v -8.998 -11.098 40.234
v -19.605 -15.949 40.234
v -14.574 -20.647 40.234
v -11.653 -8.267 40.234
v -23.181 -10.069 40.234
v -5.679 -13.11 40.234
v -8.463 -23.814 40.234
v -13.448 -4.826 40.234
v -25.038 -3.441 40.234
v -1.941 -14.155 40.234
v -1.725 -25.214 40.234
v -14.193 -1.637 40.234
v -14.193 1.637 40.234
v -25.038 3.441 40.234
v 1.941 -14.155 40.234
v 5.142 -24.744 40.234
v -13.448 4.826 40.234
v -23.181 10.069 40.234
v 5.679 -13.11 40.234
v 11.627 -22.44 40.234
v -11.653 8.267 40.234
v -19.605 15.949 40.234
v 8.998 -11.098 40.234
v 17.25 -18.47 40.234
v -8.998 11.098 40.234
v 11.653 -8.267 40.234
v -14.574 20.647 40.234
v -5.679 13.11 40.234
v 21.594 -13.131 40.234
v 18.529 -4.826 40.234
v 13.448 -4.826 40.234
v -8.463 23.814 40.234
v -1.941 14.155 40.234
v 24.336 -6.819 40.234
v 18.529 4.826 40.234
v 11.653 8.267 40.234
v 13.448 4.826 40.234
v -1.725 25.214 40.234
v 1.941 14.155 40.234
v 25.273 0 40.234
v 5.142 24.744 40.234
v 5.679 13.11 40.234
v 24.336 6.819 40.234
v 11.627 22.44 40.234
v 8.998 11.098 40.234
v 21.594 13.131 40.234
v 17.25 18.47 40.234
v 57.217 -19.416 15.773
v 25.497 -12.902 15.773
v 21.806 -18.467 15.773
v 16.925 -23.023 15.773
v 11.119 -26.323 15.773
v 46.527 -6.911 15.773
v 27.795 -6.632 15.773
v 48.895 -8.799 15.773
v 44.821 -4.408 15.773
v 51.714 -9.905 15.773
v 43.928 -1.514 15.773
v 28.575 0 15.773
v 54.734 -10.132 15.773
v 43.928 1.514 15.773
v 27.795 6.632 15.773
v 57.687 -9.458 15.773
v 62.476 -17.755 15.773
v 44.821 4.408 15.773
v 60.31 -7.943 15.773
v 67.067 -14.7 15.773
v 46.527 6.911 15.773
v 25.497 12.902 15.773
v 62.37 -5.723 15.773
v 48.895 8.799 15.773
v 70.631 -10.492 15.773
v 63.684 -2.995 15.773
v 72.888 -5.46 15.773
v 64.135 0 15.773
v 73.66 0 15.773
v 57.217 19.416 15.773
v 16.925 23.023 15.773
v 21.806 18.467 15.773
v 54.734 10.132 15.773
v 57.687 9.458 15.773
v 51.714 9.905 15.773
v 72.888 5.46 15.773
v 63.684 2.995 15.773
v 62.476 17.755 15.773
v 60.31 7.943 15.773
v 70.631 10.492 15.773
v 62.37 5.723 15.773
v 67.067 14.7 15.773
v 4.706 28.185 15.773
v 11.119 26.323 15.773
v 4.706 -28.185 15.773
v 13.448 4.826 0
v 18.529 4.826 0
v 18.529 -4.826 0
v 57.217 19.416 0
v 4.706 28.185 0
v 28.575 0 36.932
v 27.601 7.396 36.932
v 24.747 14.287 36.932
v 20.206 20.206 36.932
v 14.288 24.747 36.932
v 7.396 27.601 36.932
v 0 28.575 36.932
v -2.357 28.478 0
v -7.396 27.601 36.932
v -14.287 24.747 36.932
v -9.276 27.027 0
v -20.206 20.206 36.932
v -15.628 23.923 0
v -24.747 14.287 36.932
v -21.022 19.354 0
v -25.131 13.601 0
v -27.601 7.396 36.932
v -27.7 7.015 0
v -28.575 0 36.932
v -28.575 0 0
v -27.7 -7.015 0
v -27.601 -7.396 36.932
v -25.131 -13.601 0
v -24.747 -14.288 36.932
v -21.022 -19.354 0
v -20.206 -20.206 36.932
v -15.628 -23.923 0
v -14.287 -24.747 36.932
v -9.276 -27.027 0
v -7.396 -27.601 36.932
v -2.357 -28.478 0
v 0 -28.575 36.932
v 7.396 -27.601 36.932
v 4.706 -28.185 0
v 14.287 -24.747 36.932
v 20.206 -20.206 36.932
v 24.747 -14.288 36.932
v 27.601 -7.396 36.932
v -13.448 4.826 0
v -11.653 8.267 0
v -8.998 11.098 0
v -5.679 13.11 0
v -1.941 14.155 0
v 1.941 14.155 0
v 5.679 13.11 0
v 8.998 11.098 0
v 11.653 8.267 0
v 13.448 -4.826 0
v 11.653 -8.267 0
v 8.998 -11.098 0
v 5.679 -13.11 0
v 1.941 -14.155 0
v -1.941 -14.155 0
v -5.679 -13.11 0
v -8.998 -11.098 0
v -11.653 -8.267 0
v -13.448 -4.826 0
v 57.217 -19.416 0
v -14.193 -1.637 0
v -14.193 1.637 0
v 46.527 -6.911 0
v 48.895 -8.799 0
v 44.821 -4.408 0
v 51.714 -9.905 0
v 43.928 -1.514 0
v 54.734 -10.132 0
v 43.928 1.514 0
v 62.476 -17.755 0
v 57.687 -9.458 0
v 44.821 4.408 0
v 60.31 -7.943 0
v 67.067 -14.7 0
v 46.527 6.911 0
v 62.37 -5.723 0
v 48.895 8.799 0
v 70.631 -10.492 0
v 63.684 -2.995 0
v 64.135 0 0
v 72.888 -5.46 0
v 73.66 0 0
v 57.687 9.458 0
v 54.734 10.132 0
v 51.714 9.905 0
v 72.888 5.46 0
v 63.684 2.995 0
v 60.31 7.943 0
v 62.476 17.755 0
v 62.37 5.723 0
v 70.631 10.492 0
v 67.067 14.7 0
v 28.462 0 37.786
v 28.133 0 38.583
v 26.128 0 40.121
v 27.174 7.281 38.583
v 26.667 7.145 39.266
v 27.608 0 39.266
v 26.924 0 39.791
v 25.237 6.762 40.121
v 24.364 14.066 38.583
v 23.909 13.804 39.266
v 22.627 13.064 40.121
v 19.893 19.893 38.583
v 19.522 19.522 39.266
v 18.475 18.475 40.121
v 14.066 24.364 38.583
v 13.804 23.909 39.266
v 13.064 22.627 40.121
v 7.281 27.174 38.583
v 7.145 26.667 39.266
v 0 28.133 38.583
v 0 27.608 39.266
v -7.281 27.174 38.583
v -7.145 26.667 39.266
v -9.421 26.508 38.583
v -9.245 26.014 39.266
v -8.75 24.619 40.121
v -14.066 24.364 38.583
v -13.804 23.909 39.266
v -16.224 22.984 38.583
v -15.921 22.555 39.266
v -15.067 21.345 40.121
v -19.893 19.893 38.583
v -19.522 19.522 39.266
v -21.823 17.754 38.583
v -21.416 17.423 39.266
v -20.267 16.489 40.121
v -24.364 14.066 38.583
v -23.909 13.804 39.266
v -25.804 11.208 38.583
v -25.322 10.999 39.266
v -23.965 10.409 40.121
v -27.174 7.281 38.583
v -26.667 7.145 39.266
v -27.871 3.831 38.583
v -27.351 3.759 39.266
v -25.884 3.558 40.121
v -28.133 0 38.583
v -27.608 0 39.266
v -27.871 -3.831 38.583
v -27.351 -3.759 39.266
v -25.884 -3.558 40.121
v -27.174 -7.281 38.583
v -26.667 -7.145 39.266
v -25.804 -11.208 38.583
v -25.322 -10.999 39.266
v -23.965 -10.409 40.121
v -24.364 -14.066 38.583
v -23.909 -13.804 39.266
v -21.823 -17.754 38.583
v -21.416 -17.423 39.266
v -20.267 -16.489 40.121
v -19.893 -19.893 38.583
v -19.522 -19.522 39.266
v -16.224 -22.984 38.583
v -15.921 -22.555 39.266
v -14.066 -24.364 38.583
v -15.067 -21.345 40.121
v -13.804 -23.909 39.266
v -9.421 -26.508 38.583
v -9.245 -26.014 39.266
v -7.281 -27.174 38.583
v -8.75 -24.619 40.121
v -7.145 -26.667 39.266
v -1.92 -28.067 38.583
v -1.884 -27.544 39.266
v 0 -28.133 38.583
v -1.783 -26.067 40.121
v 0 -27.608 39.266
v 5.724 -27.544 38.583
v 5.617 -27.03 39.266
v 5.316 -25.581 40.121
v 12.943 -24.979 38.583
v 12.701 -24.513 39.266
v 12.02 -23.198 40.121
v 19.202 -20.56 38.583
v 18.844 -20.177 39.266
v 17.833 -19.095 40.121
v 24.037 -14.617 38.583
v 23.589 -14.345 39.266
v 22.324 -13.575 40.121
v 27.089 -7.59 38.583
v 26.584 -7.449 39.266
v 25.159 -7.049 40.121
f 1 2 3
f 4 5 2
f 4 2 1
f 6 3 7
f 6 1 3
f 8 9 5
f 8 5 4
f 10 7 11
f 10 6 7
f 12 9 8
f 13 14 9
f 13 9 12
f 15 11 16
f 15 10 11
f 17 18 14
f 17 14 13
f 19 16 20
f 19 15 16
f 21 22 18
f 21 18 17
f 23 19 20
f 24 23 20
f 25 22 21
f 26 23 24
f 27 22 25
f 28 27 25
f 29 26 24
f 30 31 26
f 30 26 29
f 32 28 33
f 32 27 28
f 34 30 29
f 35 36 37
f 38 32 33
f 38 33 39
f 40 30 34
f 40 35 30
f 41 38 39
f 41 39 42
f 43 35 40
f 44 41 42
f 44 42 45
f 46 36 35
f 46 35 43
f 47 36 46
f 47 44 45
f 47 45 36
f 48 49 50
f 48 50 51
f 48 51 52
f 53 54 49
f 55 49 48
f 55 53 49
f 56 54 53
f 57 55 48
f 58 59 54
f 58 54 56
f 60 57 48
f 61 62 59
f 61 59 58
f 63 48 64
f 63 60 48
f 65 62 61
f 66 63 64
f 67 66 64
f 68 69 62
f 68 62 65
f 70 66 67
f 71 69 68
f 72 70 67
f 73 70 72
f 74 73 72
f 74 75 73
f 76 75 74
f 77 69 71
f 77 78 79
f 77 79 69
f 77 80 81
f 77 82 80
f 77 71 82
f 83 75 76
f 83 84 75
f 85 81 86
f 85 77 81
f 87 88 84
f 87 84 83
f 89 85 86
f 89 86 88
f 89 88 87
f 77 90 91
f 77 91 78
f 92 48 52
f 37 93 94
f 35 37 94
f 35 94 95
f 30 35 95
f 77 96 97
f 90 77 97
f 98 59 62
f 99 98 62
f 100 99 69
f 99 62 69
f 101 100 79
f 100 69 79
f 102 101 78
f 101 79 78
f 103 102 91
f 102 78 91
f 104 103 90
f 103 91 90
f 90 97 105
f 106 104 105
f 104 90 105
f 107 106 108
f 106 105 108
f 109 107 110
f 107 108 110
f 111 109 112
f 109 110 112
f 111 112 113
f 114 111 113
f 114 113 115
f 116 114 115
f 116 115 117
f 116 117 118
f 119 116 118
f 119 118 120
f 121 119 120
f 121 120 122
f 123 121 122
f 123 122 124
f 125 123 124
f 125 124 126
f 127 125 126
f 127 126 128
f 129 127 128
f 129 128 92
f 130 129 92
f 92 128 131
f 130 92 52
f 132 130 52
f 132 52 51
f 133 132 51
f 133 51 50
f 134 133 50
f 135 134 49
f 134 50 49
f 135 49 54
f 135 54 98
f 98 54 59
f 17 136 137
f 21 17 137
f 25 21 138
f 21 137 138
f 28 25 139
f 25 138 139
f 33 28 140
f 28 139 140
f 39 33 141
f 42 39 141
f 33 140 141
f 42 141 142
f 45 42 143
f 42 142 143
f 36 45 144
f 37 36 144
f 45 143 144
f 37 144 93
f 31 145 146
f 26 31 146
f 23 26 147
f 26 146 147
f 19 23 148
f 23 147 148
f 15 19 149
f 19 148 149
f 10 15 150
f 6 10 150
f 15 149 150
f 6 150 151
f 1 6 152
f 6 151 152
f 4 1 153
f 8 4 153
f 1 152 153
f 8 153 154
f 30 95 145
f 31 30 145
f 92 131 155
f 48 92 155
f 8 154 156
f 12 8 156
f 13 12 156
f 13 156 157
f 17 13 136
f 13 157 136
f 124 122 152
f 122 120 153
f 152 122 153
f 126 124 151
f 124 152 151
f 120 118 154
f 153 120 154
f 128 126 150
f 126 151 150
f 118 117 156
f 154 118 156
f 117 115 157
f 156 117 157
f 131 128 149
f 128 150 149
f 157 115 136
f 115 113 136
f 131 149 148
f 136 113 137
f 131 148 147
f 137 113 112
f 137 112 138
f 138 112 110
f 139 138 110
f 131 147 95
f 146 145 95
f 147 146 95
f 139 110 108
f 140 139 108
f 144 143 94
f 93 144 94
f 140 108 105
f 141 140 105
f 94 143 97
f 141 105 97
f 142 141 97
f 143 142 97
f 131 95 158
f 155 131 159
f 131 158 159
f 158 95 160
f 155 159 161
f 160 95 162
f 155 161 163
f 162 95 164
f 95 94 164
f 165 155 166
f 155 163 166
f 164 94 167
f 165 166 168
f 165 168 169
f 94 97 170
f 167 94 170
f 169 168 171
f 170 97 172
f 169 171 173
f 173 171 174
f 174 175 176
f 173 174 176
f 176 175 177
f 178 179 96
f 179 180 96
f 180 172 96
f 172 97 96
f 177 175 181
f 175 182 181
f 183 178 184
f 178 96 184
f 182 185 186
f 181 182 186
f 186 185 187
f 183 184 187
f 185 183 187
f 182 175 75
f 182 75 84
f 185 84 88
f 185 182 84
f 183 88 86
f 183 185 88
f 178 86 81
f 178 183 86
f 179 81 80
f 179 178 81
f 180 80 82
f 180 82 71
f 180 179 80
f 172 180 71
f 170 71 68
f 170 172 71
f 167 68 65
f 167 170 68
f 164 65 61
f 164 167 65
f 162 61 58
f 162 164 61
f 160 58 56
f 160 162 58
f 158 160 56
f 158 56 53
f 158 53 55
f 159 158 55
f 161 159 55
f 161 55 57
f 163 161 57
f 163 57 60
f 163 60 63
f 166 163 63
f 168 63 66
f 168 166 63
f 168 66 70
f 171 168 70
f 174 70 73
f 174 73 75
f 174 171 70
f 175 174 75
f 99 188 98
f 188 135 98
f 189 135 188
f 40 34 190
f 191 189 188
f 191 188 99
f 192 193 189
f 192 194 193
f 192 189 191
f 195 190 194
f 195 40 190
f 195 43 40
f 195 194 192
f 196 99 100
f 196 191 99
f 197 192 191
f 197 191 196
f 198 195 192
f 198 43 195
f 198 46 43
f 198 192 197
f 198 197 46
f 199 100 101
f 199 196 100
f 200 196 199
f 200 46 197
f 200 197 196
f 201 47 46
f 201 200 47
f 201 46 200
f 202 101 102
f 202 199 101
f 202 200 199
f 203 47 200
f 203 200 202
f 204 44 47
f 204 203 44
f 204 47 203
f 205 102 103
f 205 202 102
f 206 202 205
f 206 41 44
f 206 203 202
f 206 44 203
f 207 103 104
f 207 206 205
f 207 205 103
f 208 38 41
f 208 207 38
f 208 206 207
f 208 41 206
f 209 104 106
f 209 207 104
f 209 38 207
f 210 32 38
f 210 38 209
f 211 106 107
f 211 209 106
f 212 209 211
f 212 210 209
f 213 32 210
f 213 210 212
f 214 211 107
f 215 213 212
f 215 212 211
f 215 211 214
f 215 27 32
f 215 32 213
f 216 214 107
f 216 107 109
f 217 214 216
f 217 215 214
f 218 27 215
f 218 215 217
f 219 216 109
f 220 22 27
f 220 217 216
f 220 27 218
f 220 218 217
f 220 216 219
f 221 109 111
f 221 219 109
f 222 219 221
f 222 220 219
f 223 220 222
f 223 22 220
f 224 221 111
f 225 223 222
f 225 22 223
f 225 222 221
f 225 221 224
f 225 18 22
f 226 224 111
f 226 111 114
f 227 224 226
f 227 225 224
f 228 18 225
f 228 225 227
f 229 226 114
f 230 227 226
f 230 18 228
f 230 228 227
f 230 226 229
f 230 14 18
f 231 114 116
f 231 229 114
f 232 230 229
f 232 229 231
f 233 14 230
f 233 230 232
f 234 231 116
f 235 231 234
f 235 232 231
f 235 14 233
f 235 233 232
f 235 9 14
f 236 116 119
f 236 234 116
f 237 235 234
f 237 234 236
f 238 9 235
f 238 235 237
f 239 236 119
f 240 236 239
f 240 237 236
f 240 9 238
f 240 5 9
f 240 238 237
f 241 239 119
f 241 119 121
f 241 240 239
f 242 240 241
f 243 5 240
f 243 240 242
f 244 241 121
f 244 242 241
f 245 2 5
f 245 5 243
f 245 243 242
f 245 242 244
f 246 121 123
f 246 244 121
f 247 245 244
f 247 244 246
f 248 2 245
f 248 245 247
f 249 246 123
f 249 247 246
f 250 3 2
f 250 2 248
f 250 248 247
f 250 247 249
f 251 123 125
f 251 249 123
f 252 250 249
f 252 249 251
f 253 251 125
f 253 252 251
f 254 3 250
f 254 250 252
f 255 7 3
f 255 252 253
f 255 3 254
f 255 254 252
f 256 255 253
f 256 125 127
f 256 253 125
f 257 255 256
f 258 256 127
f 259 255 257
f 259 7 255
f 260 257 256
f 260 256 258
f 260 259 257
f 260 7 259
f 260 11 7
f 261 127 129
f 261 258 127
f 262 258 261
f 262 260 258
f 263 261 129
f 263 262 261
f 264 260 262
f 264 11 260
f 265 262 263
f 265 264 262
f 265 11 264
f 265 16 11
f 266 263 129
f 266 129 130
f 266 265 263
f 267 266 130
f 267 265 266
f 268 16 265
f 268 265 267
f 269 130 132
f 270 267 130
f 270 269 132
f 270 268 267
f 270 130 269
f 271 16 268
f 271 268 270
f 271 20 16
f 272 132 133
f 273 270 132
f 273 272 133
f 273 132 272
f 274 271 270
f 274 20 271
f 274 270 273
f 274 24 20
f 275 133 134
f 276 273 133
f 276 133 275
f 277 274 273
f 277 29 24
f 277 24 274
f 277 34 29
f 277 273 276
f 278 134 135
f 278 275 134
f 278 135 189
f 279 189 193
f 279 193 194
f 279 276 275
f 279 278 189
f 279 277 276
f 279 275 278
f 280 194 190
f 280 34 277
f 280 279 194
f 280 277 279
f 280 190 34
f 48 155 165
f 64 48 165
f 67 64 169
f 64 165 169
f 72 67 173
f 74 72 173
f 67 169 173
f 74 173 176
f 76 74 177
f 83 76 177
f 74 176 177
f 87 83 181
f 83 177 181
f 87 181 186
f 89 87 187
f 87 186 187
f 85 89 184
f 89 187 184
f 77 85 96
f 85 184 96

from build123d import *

# Parameters (mm, degrees)
F0_R     = 28.575
F1_DEPTH = 40.2336
F2_R     = 10.16
F3_DEPTH = 15.7734
F4_R     = 3.302


# Not quite as in the source:
# - a feature names something its author has since deleted; it is built from what else it names


with BuildPart() as f1:
    # F0 (on Top) → F1 (new body)
    with BuildSketch(Plane.XY):
        Circle(F0_R)
        with BuildLine():
            ThreePointArc((-13.4477648793, 4.826), (0, 14.2875), (13.4477648793, 4.826))
            Line((13.4477648793, 4.826), (18.5293, 4.826))
            Line((18.5293, 4.826), (18.5293, -4.826))
            Line((18.5293, -4.826), (13.4477648793, -4.826))
            ThreePointArc((13.4477648793, -4.826), (0, -14.2875), (-13.4477648793, -4.826))
            Line((-13.4477648793, -4.826), (-18.5293, -4.826))
            Line((-18.5293, -4.826), (-18.5293, 4.826))
            Line((-18.5293, 4.826), (-13.4477648793, 4.826))
        make_face(mode=Mode.SUBTRACT)
        with BuildLine():
            ThreePointArc((-13.4477648793, -4.826), (-14.2875, 0), (-13.4477648793, 4.826))
            Line((-13.4477648793, 4.826), (-18.5293, 4.826))
            Line((-18.5293, 4.826), (-18.5293, -4.826))
            Line((-18.5293, -4.826), (-13.4477648793, -4.826))
        make_face()
    extrude(amount=F1_DEPTH)

    # F2 (on Top) → F3 (join)
    with BuildSketch(Plane.XY):
        with BuildLine():
            ThreePointArc((57.2172352941, -19.4161565532), (68.9970276056, -12.7215530348), (73.66, 0))
            ThreePointArc((73.66, 0), (68.9970276056, 12.7215530348), (57.2172352941, 19.4161565532))
            ThreePointArc((57.2172352941, 19.4161565532), (34.29, 0), (57.2172352941, -19.4161565532))
        make_face()
        with Locations((53.975, 0)):
            Circle(F2_R, mode=Mode.SUBTRACT)
        with BuildLine():
            ThreePointArc((57.2172352941, -19.4161565532), (34.29, 0), (57.2172352941, 19.4161565532))
            Line((57.2172352941, 19.4161565532), (4.7064705882, 28.1847433836))
            ThreePointArc((4.7064705882, 28.1847433836), (21.8061691049, 18.4667705344), (28.575, 0))
            ThreePointArc((28.575, 0), (21.8061691049, -18.4667705344), (4.7064705882, -28.1847433836))
            Line((4.7064705882, -28.1847433836), (57.2172352941, -19.4161565532))
        make_face()
    extrude(amount=F3_DEPTH)

    # F4
    f4_edges = [f1.edges().sort_by_distance(p)[0] for p in [
        (-28.575, 0, 40.2336),
    ]]
    fillet(f4_edges, radius=F4_R)


solid = f1.part
